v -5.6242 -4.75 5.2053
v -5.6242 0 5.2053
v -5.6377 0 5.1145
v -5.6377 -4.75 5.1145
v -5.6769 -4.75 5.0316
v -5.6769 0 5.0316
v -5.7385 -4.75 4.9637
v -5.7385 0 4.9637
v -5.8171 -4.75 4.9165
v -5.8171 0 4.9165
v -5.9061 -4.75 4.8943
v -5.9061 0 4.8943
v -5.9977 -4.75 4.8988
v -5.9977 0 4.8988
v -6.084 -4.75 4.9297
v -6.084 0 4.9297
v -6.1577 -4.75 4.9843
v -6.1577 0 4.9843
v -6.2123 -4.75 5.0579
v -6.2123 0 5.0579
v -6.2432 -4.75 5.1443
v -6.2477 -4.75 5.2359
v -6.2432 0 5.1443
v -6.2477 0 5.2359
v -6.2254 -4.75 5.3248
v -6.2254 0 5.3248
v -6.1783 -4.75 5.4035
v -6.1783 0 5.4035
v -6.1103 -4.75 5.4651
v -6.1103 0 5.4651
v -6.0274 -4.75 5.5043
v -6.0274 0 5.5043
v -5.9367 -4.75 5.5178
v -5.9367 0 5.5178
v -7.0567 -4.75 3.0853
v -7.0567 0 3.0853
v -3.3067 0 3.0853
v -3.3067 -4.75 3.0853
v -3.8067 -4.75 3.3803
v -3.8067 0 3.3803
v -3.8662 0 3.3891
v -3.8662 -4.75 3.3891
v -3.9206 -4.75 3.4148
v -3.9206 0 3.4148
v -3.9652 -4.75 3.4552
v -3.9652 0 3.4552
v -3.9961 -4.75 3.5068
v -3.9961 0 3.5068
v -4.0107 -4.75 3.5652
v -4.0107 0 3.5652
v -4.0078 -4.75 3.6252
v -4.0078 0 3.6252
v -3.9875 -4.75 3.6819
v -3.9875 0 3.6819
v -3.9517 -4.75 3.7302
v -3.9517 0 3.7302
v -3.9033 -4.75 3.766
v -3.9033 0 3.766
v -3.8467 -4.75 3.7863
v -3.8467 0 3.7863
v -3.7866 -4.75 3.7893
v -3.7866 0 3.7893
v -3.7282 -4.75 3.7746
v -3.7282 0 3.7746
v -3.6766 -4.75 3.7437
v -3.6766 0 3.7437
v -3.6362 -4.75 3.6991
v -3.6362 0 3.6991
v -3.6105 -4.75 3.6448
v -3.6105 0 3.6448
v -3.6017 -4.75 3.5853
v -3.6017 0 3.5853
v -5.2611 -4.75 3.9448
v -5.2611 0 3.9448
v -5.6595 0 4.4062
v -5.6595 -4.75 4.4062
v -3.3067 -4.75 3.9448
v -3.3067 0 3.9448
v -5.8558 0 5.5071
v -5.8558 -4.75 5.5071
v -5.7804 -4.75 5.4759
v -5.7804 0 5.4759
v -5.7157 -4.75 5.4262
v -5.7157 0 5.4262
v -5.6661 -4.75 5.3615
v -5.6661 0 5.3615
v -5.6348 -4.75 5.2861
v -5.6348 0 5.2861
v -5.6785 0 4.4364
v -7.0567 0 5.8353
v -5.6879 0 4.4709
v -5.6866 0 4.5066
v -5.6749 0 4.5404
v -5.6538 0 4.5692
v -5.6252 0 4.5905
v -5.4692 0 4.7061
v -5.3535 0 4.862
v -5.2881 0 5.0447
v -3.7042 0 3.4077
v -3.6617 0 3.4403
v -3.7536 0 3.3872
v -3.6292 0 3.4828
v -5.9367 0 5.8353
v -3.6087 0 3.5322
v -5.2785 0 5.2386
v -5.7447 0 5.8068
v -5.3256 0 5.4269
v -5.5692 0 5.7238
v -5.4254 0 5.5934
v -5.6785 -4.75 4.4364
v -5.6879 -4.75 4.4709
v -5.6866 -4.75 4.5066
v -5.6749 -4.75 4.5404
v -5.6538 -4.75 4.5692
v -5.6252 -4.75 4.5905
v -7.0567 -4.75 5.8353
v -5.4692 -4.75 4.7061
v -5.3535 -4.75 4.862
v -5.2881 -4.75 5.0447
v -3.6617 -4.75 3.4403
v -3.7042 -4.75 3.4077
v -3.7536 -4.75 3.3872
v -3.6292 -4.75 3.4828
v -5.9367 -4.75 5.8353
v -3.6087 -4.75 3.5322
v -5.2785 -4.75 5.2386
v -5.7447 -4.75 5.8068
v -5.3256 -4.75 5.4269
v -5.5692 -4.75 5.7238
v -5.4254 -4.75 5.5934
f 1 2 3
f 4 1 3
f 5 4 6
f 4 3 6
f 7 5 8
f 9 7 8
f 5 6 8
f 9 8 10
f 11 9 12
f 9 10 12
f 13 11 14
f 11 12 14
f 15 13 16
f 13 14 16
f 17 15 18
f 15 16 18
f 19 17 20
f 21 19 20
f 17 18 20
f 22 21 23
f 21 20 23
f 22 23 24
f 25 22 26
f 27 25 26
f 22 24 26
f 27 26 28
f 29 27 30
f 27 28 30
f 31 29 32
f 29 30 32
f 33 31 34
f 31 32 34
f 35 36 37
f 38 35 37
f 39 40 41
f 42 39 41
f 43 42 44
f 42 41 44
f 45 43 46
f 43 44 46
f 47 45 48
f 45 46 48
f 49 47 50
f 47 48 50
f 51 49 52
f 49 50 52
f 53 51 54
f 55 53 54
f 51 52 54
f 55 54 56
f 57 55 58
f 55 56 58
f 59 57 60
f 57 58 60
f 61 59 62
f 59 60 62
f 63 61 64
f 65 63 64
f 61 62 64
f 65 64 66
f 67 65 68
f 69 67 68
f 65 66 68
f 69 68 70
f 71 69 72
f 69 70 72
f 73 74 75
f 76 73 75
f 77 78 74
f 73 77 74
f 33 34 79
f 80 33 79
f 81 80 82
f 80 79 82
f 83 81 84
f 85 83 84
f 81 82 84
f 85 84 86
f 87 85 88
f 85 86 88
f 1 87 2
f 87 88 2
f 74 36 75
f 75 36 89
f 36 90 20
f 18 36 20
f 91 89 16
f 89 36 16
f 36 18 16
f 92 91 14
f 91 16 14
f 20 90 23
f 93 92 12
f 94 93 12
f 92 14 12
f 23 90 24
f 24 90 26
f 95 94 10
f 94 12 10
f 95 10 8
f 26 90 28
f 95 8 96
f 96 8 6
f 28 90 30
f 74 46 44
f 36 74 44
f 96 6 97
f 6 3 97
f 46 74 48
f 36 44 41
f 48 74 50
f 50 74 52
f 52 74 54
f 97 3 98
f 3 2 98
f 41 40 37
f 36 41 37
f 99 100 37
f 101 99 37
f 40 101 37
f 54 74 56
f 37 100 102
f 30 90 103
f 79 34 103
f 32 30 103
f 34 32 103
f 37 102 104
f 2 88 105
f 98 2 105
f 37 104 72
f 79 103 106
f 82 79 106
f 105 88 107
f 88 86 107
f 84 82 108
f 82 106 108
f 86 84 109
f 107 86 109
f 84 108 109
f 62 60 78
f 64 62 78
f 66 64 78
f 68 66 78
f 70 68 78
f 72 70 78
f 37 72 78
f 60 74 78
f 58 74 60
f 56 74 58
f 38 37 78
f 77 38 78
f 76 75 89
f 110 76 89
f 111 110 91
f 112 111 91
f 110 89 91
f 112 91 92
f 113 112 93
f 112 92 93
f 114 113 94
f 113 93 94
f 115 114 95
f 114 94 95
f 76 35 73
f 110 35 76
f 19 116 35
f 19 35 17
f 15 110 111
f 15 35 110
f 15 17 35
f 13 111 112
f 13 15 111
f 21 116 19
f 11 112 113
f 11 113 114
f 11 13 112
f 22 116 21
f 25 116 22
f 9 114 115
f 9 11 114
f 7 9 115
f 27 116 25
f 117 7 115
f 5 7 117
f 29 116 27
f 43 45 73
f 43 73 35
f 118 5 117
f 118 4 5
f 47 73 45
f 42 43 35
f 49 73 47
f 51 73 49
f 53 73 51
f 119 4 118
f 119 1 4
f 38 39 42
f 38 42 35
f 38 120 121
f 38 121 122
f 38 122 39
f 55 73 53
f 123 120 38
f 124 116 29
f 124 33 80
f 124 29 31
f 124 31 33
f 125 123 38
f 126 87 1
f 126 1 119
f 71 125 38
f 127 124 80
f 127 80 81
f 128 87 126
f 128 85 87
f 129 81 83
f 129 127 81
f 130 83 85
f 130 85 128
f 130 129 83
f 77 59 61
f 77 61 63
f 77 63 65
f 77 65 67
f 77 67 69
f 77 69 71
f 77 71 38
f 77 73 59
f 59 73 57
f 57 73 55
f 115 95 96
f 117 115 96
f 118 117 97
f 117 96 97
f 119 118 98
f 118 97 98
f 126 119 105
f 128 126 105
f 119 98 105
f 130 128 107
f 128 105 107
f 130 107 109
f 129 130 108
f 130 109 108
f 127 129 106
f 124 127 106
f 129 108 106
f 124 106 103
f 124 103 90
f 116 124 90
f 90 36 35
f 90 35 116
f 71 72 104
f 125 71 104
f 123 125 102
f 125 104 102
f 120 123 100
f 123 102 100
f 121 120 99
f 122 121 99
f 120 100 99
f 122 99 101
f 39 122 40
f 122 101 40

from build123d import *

# Parameters (mm, degrees)
F0_W     = 0.25
F0_H     = 2.75
F1_DEPTH = 4.75


with BuildPart() as f1:
    # F0 (on Front) → F1 (new body)
    with BuildSketch(Plane.XZ):
        with Locations((-6.931698, 4.460252)):
            Rectangle(F0_W, F0_H)
        with BuildLine():
            Line((-5.936698, 5.835252), (-6.806698, 5.835252))
            Line((-6.806698, 5.835252), (-6.806698, 3.085252))
            Line((-6.806698, 3.085252), (-4.306698, 3.085252))
            Line((-4.306698, 3.085252), (-3.806698, 3.085252))
            Line((-3.806698, 3.085252), (-3.806698, 3.380252))
            ThreePointArc((-3.806698, 3.380252), (-3.951655, 3.730209), (-3.601698, 3.585252))
            Line((-3.601698, 3.585252), (-3.306698, 3.585252))
            Line((-3.306698, 3.585252), (-3.306698, 3.944849))
            Line((-3.306698, 3.944849), (-5.26108, 3.944849))
            Line((-5.26108, 3.944849), (-5.65947, 4.406234))
            ThreePointArc((-5.65947, 4.406234), (-5.686617, 4.506619), (-5.625169, 4.590512))
            ThreePointArc((-5.625169, 4.590512), (-5.295132, 5.334467), (-5.936698, 5.835252))
        make_face()
        with BuildLine():
            ThreePointArc((-5.624198, 5.205252), (-6.157669, 4.984282), (-5.936698, 5.517752))
            ThreePointArc((-5.936698, 5.517752), (-5.715727, 5.426223), (-5.624198, 5.205252))
        make_face(mode=Mode.SUBTRACT)
        with BuildLine():
            Line((-3.806698, 3.380252), (-3.806698, 3.085252))
            Line((-3.806698, 3.085252), (-3.306698, 3.085252))
            Line((-3.306698, 3.085252), (-3.306698, 3.585252))
            Line((-3.306698, 3.585252), (-3.601698, 3.585252))
            ThreePointArc((-3.601698, 3.585252), (-3.661741, 3.440296), (-3.806698, 3.380252))
        make_face()
    extrude(amount=F1_DEPTH)


solid = f1.part
